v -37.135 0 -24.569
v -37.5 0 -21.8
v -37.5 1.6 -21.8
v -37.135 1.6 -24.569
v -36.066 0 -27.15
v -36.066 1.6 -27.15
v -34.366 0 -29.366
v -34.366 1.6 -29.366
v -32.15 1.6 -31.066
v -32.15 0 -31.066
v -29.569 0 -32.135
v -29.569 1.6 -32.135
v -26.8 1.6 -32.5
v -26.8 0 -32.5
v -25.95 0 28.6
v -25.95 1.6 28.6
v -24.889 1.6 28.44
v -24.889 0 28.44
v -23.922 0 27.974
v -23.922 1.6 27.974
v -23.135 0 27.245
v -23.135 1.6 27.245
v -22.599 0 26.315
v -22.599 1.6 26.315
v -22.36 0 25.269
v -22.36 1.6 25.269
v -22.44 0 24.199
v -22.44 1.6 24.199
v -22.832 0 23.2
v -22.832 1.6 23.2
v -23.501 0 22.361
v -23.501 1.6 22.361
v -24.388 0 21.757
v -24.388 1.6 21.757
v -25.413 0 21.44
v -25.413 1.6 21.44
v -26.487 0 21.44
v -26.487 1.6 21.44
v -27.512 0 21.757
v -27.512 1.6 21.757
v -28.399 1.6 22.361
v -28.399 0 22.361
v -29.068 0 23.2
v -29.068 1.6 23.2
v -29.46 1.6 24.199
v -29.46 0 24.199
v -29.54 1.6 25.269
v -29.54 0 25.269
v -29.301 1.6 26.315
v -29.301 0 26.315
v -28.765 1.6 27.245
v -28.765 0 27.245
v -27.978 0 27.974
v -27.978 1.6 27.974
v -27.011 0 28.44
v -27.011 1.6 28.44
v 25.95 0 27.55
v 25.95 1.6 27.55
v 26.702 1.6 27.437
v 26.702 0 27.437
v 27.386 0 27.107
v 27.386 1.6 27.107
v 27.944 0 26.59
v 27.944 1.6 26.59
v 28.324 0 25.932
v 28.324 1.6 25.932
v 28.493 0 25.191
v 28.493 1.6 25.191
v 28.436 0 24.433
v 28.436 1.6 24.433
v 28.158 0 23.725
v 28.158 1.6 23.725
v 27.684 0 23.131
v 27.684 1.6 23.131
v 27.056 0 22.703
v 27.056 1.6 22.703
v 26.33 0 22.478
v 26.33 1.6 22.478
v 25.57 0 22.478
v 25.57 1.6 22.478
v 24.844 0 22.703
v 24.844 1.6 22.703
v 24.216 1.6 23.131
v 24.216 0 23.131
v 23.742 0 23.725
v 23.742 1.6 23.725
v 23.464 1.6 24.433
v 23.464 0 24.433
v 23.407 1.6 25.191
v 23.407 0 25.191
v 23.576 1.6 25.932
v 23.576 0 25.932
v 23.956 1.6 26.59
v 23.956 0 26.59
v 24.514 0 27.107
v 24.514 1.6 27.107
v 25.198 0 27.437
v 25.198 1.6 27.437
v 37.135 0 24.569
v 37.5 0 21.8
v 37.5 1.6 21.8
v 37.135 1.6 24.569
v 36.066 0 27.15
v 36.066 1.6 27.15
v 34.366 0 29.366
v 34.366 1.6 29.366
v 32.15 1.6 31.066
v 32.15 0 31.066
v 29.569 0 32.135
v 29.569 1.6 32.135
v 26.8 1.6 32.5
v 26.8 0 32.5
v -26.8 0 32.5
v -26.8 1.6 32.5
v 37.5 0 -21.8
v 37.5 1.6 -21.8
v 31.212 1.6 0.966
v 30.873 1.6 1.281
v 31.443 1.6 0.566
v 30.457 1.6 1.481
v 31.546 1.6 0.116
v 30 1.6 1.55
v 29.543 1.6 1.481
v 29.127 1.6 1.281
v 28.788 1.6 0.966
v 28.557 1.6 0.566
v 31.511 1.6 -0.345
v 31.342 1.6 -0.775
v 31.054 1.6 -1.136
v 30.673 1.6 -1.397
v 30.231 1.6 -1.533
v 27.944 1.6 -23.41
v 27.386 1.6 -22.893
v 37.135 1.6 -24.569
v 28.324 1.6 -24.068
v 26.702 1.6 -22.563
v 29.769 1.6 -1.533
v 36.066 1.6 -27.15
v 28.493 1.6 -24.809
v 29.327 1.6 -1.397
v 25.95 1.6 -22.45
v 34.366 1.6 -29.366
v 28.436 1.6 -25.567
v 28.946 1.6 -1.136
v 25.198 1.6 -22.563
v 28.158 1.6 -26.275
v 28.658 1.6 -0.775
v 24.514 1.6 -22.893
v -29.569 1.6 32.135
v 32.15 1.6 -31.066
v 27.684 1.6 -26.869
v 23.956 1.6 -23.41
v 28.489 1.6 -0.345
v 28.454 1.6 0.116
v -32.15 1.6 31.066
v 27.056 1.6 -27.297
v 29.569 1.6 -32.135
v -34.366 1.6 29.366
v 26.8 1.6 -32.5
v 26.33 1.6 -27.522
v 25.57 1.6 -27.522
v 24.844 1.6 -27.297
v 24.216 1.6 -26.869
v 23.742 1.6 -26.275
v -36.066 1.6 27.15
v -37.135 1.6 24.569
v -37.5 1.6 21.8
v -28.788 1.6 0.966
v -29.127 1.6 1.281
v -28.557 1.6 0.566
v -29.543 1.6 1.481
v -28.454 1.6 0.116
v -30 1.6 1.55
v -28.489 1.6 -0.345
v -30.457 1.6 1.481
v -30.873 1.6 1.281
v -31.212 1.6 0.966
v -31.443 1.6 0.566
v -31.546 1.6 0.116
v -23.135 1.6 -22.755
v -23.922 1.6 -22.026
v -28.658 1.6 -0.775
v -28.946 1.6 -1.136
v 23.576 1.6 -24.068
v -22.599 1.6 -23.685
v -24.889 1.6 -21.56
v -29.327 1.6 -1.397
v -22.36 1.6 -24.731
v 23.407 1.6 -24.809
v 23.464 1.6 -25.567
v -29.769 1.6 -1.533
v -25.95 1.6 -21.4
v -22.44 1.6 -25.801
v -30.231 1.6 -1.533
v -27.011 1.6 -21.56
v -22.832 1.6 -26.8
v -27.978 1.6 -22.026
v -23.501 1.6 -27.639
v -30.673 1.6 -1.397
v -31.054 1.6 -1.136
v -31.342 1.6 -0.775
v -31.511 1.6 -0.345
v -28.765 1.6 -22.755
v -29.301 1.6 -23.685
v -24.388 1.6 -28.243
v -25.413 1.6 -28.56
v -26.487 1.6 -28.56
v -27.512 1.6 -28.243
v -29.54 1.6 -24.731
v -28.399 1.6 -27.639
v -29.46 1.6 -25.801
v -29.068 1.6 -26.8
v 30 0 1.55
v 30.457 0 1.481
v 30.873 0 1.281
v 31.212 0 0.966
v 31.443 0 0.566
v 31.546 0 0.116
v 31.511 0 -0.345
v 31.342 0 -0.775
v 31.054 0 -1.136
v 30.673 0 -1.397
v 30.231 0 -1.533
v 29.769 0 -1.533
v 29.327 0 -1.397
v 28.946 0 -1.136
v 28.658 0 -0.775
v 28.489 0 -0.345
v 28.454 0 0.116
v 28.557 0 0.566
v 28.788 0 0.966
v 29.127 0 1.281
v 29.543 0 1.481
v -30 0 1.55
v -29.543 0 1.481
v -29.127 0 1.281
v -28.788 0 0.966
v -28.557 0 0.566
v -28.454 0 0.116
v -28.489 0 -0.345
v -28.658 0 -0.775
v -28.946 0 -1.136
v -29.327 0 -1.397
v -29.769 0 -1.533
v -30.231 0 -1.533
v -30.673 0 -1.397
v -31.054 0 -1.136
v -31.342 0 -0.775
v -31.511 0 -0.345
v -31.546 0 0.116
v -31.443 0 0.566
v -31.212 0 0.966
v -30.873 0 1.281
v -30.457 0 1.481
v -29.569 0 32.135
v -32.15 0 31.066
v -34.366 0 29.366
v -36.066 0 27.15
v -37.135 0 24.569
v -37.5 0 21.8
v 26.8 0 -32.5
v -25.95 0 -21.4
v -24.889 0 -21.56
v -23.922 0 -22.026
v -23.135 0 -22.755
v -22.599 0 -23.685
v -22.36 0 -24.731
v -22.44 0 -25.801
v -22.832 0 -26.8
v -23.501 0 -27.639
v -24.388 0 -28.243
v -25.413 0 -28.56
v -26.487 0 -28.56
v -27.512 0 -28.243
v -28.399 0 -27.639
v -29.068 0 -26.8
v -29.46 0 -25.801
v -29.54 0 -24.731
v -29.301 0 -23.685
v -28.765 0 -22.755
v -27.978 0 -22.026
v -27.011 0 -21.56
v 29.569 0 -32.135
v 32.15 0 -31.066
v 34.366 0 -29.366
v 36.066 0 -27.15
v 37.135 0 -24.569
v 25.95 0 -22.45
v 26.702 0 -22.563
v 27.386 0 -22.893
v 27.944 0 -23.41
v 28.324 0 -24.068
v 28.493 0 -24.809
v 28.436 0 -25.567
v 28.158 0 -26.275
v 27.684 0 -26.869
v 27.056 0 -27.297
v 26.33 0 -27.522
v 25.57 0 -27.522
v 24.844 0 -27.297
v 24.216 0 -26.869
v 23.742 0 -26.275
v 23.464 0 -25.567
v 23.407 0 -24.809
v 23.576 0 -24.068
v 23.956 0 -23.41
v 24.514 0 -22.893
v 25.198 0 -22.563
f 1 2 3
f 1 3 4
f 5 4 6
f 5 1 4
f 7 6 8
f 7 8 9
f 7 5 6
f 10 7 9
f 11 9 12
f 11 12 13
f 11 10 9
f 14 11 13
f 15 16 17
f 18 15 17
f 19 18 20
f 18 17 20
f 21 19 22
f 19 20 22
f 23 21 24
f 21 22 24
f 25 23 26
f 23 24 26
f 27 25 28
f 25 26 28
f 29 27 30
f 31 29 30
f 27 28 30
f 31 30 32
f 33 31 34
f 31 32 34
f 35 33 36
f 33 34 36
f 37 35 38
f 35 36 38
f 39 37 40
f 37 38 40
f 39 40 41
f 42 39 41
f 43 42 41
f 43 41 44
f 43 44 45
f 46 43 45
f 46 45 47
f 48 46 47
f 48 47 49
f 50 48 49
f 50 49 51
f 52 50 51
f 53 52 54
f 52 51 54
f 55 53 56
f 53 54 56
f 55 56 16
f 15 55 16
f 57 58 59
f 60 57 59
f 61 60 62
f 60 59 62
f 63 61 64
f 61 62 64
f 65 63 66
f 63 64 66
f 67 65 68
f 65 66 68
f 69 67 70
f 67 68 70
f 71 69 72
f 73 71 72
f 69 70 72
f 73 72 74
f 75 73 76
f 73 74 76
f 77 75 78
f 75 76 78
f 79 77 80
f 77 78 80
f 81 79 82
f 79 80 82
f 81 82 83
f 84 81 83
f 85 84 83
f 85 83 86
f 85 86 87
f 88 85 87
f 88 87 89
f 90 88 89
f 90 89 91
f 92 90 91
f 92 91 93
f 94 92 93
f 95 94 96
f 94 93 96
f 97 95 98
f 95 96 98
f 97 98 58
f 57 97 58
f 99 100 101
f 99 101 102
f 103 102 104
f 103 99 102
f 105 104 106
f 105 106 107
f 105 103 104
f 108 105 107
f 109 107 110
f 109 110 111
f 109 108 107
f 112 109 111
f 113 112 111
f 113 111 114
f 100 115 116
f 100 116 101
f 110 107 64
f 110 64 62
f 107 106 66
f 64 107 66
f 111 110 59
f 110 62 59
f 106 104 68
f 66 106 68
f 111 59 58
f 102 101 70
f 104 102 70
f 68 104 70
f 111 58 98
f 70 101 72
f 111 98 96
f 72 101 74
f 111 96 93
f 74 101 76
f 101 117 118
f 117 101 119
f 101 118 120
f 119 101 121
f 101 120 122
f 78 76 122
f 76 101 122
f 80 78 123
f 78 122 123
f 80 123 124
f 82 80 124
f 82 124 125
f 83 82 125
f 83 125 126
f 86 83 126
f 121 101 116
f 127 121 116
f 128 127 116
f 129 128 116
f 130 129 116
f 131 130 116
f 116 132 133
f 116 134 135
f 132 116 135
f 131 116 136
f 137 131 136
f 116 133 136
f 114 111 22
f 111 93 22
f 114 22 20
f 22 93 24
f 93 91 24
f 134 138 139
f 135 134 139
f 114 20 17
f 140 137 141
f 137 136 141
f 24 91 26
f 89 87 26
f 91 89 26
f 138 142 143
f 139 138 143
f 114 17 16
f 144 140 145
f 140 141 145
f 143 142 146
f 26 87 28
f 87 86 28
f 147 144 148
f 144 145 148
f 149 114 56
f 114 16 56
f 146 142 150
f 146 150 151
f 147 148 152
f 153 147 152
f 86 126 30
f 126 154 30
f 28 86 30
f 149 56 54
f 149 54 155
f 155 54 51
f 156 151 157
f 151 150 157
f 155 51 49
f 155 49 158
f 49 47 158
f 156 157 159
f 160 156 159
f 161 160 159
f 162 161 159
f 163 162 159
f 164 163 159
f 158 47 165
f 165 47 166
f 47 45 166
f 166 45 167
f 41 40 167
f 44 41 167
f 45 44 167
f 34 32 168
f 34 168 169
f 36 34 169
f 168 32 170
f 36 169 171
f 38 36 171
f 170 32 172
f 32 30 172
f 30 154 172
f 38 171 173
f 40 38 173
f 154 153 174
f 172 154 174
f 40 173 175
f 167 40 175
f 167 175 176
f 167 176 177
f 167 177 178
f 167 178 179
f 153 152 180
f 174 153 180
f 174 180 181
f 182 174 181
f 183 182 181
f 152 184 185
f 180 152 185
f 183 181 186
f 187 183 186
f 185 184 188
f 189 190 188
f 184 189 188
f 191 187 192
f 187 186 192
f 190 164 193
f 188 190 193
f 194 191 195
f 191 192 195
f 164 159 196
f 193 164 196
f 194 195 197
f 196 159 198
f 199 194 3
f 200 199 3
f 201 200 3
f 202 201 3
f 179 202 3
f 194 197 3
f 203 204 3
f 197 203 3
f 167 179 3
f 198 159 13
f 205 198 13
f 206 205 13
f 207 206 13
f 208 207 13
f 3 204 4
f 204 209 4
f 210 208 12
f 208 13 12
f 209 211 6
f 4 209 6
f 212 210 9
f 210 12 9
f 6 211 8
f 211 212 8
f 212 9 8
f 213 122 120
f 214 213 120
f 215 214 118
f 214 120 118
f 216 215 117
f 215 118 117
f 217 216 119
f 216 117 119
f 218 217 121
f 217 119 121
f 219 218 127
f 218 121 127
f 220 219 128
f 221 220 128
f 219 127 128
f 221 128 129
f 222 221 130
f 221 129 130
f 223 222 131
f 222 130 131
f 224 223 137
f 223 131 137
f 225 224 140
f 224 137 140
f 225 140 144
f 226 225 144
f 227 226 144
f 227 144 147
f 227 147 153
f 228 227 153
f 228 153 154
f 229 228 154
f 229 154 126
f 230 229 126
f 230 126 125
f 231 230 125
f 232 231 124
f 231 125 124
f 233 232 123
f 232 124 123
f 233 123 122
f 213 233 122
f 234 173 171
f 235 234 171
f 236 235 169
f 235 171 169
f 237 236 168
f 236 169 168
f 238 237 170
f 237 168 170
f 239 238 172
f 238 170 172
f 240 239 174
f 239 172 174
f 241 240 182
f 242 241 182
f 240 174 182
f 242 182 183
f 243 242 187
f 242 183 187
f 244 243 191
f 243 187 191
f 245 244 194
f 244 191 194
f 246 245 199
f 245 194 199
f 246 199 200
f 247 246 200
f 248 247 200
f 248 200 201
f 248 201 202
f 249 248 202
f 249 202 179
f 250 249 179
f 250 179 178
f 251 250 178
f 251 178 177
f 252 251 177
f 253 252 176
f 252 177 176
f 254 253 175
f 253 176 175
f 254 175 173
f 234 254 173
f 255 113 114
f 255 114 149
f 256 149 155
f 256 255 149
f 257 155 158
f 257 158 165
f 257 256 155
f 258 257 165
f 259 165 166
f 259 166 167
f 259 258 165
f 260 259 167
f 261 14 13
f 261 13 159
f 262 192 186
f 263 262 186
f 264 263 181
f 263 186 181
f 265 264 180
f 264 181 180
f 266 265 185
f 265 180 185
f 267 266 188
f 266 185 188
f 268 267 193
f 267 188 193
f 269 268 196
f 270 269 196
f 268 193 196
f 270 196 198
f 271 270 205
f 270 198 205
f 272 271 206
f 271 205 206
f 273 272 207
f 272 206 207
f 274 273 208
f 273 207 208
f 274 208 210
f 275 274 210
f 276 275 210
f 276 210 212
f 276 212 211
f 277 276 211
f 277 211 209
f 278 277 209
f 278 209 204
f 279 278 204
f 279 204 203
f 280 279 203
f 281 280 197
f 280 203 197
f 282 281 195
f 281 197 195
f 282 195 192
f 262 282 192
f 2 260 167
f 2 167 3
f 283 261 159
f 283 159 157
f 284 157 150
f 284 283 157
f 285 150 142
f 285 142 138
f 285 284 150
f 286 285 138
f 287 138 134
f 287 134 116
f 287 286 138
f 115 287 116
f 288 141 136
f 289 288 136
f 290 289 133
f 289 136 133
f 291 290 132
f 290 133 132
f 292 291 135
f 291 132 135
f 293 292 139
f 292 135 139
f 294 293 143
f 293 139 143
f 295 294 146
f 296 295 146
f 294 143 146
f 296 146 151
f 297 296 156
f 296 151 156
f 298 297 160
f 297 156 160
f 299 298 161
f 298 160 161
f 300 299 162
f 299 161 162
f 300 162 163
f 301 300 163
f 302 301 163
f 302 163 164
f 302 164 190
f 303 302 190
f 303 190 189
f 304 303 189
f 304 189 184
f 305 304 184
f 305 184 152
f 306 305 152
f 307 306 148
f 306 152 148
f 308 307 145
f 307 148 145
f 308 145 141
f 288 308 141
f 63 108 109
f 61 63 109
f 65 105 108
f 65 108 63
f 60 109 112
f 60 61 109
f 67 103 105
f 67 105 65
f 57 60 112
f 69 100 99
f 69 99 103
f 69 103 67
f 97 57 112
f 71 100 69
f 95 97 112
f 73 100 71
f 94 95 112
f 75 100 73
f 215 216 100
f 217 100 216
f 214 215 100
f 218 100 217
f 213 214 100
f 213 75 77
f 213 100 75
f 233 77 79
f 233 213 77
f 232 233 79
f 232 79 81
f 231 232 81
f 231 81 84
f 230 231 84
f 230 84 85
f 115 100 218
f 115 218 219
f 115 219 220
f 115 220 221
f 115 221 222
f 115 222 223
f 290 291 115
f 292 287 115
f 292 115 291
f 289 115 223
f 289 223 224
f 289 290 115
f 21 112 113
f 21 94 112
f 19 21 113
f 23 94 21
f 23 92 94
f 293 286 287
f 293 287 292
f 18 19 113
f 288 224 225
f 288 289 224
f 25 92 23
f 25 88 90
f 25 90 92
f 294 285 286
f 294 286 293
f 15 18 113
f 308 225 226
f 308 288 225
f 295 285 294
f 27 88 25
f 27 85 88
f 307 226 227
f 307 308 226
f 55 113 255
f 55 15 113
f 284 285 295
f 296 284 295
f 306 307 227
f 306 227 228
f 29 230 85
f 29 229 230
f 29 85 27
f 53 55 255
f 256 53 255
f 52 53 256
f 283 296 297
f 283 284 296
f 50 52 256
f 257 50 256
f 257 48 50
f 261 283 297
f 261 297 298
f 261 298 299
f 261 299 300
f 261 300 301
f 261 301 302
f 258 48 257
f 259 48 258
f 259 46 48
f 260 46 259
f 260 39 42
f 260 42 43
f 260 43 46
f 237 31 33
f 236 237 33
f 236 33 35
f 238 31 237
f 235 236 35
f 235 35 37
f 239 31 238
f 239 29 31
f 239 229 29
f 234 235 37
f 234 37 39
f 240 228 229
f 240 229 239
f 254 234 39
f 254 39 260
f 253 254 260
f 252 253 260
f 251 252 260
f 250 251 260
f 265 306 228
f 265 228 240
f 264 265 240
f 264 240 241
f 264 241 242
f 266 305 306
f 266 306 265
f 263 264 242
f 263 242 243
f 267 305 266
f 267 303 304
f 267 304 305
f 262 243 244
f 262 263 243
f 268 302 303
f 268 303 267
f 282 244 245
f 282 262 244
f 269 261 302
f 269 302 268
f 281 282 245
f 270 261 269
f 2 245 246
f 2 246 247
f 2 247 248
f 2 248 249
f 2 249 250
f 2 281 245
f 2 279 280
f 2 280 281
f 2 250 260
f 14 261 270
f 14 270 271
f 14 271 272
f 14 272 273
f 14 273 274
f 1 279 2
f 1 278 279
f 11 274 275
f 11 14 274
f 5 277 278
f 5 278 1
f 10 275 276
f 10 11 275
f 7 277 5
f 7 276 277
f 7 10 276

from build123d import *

# Parameters (mm, degrees)
BOSS_EXTRUDE1_DEPTH = 1.6
SKETCH2_R           = 2.55
SKETCH2_R_2         = 3.6
CUT_EXTRUDE1_DEPTH  = 1.6
SKETCH3_R           = 1.55
CUT_EXTRUDE2_DEPTH  = 1.6


with BuildPart() as part:
    # Sketch1 → Boss-Extrude1 (new body)
    with BuildSketch(Plane(origin=(0, 0, 0), x_dir=(1, 0, 0), z_dir=(0, 1, 0))):
        with BuildLine():
            Line((-26.8, 32.5), (26.8, 32.5))
            ThreePointArc((26.8, 32.5), (34.366042559, 29.366042559), (37.5, 21.8))
            Line((37.5, 21.8), (37.5, -21.8))
            ThreePointArc((37.5, -21.8), (34.366042559, -29.366042559), (26.8, -32.5))
            Line((26.8, -32.5), (-26.8, -32.5))
            ThreePointArc((-26.8, -32.5), (-34.366042559, -29.366042559), (-37.5, -21.8))
            Line((-37.5, -21.8), (-37.5, 21.8))
            ThreePointArc((-37.5, 21.8), (-34.366042559, 29.366042559), (-26.8, 32.5))
        make_face()
    extrude(amount=BOSS_EXTRUDE1_DEPTH)

    # Sketch2 → Cut-Extrude1 (cut)
    with BuildSketch(Plane(origin=(0, 1.6, 0), x_dir=(1, 0, 0), z_dir=(0, 1, 0))):
        with Locations(Location((25.95, 25, 0), (0, 0, 270))):
            Circle(SKETCH2_R)
        with Locations(Location((25.95, -25, 0), (0, 0, 270))):
            Circle(SKETCH2_R)
        with Locations(Location((-25.95, -25, 0), (0, 0, 270))):
            Circle(SKETCH2_R_2)
        with Locations(Location((-25.95, 25, 0), (0, 0, 270))):
            Circle(SKETCH2_R_2)
    extrude(amount=-CUT_EXTRUDE1_DEPTH, mode=Mode.SUBTRACT)

    # Sketch3 → Cut-Extrude2 (cut)
    with BuildSketch(Plane(origin=(0, 1.6, 0), x_dir=(1, 0, 0), z_dir=(0, 1, 0))):
        with Locations(Location((-30, 0, 0), (0, 0, 270))):
            Circle(SKETCH3_R)
        with Locations(Location((30, 0, 0), (0, 0, 270))):
            Circle(SKETCH3_R)
    extrude(amount=-CUT_EXTRUDE2_DEPTH, mode=Mode.SUBTRACT)


solid = part.part
